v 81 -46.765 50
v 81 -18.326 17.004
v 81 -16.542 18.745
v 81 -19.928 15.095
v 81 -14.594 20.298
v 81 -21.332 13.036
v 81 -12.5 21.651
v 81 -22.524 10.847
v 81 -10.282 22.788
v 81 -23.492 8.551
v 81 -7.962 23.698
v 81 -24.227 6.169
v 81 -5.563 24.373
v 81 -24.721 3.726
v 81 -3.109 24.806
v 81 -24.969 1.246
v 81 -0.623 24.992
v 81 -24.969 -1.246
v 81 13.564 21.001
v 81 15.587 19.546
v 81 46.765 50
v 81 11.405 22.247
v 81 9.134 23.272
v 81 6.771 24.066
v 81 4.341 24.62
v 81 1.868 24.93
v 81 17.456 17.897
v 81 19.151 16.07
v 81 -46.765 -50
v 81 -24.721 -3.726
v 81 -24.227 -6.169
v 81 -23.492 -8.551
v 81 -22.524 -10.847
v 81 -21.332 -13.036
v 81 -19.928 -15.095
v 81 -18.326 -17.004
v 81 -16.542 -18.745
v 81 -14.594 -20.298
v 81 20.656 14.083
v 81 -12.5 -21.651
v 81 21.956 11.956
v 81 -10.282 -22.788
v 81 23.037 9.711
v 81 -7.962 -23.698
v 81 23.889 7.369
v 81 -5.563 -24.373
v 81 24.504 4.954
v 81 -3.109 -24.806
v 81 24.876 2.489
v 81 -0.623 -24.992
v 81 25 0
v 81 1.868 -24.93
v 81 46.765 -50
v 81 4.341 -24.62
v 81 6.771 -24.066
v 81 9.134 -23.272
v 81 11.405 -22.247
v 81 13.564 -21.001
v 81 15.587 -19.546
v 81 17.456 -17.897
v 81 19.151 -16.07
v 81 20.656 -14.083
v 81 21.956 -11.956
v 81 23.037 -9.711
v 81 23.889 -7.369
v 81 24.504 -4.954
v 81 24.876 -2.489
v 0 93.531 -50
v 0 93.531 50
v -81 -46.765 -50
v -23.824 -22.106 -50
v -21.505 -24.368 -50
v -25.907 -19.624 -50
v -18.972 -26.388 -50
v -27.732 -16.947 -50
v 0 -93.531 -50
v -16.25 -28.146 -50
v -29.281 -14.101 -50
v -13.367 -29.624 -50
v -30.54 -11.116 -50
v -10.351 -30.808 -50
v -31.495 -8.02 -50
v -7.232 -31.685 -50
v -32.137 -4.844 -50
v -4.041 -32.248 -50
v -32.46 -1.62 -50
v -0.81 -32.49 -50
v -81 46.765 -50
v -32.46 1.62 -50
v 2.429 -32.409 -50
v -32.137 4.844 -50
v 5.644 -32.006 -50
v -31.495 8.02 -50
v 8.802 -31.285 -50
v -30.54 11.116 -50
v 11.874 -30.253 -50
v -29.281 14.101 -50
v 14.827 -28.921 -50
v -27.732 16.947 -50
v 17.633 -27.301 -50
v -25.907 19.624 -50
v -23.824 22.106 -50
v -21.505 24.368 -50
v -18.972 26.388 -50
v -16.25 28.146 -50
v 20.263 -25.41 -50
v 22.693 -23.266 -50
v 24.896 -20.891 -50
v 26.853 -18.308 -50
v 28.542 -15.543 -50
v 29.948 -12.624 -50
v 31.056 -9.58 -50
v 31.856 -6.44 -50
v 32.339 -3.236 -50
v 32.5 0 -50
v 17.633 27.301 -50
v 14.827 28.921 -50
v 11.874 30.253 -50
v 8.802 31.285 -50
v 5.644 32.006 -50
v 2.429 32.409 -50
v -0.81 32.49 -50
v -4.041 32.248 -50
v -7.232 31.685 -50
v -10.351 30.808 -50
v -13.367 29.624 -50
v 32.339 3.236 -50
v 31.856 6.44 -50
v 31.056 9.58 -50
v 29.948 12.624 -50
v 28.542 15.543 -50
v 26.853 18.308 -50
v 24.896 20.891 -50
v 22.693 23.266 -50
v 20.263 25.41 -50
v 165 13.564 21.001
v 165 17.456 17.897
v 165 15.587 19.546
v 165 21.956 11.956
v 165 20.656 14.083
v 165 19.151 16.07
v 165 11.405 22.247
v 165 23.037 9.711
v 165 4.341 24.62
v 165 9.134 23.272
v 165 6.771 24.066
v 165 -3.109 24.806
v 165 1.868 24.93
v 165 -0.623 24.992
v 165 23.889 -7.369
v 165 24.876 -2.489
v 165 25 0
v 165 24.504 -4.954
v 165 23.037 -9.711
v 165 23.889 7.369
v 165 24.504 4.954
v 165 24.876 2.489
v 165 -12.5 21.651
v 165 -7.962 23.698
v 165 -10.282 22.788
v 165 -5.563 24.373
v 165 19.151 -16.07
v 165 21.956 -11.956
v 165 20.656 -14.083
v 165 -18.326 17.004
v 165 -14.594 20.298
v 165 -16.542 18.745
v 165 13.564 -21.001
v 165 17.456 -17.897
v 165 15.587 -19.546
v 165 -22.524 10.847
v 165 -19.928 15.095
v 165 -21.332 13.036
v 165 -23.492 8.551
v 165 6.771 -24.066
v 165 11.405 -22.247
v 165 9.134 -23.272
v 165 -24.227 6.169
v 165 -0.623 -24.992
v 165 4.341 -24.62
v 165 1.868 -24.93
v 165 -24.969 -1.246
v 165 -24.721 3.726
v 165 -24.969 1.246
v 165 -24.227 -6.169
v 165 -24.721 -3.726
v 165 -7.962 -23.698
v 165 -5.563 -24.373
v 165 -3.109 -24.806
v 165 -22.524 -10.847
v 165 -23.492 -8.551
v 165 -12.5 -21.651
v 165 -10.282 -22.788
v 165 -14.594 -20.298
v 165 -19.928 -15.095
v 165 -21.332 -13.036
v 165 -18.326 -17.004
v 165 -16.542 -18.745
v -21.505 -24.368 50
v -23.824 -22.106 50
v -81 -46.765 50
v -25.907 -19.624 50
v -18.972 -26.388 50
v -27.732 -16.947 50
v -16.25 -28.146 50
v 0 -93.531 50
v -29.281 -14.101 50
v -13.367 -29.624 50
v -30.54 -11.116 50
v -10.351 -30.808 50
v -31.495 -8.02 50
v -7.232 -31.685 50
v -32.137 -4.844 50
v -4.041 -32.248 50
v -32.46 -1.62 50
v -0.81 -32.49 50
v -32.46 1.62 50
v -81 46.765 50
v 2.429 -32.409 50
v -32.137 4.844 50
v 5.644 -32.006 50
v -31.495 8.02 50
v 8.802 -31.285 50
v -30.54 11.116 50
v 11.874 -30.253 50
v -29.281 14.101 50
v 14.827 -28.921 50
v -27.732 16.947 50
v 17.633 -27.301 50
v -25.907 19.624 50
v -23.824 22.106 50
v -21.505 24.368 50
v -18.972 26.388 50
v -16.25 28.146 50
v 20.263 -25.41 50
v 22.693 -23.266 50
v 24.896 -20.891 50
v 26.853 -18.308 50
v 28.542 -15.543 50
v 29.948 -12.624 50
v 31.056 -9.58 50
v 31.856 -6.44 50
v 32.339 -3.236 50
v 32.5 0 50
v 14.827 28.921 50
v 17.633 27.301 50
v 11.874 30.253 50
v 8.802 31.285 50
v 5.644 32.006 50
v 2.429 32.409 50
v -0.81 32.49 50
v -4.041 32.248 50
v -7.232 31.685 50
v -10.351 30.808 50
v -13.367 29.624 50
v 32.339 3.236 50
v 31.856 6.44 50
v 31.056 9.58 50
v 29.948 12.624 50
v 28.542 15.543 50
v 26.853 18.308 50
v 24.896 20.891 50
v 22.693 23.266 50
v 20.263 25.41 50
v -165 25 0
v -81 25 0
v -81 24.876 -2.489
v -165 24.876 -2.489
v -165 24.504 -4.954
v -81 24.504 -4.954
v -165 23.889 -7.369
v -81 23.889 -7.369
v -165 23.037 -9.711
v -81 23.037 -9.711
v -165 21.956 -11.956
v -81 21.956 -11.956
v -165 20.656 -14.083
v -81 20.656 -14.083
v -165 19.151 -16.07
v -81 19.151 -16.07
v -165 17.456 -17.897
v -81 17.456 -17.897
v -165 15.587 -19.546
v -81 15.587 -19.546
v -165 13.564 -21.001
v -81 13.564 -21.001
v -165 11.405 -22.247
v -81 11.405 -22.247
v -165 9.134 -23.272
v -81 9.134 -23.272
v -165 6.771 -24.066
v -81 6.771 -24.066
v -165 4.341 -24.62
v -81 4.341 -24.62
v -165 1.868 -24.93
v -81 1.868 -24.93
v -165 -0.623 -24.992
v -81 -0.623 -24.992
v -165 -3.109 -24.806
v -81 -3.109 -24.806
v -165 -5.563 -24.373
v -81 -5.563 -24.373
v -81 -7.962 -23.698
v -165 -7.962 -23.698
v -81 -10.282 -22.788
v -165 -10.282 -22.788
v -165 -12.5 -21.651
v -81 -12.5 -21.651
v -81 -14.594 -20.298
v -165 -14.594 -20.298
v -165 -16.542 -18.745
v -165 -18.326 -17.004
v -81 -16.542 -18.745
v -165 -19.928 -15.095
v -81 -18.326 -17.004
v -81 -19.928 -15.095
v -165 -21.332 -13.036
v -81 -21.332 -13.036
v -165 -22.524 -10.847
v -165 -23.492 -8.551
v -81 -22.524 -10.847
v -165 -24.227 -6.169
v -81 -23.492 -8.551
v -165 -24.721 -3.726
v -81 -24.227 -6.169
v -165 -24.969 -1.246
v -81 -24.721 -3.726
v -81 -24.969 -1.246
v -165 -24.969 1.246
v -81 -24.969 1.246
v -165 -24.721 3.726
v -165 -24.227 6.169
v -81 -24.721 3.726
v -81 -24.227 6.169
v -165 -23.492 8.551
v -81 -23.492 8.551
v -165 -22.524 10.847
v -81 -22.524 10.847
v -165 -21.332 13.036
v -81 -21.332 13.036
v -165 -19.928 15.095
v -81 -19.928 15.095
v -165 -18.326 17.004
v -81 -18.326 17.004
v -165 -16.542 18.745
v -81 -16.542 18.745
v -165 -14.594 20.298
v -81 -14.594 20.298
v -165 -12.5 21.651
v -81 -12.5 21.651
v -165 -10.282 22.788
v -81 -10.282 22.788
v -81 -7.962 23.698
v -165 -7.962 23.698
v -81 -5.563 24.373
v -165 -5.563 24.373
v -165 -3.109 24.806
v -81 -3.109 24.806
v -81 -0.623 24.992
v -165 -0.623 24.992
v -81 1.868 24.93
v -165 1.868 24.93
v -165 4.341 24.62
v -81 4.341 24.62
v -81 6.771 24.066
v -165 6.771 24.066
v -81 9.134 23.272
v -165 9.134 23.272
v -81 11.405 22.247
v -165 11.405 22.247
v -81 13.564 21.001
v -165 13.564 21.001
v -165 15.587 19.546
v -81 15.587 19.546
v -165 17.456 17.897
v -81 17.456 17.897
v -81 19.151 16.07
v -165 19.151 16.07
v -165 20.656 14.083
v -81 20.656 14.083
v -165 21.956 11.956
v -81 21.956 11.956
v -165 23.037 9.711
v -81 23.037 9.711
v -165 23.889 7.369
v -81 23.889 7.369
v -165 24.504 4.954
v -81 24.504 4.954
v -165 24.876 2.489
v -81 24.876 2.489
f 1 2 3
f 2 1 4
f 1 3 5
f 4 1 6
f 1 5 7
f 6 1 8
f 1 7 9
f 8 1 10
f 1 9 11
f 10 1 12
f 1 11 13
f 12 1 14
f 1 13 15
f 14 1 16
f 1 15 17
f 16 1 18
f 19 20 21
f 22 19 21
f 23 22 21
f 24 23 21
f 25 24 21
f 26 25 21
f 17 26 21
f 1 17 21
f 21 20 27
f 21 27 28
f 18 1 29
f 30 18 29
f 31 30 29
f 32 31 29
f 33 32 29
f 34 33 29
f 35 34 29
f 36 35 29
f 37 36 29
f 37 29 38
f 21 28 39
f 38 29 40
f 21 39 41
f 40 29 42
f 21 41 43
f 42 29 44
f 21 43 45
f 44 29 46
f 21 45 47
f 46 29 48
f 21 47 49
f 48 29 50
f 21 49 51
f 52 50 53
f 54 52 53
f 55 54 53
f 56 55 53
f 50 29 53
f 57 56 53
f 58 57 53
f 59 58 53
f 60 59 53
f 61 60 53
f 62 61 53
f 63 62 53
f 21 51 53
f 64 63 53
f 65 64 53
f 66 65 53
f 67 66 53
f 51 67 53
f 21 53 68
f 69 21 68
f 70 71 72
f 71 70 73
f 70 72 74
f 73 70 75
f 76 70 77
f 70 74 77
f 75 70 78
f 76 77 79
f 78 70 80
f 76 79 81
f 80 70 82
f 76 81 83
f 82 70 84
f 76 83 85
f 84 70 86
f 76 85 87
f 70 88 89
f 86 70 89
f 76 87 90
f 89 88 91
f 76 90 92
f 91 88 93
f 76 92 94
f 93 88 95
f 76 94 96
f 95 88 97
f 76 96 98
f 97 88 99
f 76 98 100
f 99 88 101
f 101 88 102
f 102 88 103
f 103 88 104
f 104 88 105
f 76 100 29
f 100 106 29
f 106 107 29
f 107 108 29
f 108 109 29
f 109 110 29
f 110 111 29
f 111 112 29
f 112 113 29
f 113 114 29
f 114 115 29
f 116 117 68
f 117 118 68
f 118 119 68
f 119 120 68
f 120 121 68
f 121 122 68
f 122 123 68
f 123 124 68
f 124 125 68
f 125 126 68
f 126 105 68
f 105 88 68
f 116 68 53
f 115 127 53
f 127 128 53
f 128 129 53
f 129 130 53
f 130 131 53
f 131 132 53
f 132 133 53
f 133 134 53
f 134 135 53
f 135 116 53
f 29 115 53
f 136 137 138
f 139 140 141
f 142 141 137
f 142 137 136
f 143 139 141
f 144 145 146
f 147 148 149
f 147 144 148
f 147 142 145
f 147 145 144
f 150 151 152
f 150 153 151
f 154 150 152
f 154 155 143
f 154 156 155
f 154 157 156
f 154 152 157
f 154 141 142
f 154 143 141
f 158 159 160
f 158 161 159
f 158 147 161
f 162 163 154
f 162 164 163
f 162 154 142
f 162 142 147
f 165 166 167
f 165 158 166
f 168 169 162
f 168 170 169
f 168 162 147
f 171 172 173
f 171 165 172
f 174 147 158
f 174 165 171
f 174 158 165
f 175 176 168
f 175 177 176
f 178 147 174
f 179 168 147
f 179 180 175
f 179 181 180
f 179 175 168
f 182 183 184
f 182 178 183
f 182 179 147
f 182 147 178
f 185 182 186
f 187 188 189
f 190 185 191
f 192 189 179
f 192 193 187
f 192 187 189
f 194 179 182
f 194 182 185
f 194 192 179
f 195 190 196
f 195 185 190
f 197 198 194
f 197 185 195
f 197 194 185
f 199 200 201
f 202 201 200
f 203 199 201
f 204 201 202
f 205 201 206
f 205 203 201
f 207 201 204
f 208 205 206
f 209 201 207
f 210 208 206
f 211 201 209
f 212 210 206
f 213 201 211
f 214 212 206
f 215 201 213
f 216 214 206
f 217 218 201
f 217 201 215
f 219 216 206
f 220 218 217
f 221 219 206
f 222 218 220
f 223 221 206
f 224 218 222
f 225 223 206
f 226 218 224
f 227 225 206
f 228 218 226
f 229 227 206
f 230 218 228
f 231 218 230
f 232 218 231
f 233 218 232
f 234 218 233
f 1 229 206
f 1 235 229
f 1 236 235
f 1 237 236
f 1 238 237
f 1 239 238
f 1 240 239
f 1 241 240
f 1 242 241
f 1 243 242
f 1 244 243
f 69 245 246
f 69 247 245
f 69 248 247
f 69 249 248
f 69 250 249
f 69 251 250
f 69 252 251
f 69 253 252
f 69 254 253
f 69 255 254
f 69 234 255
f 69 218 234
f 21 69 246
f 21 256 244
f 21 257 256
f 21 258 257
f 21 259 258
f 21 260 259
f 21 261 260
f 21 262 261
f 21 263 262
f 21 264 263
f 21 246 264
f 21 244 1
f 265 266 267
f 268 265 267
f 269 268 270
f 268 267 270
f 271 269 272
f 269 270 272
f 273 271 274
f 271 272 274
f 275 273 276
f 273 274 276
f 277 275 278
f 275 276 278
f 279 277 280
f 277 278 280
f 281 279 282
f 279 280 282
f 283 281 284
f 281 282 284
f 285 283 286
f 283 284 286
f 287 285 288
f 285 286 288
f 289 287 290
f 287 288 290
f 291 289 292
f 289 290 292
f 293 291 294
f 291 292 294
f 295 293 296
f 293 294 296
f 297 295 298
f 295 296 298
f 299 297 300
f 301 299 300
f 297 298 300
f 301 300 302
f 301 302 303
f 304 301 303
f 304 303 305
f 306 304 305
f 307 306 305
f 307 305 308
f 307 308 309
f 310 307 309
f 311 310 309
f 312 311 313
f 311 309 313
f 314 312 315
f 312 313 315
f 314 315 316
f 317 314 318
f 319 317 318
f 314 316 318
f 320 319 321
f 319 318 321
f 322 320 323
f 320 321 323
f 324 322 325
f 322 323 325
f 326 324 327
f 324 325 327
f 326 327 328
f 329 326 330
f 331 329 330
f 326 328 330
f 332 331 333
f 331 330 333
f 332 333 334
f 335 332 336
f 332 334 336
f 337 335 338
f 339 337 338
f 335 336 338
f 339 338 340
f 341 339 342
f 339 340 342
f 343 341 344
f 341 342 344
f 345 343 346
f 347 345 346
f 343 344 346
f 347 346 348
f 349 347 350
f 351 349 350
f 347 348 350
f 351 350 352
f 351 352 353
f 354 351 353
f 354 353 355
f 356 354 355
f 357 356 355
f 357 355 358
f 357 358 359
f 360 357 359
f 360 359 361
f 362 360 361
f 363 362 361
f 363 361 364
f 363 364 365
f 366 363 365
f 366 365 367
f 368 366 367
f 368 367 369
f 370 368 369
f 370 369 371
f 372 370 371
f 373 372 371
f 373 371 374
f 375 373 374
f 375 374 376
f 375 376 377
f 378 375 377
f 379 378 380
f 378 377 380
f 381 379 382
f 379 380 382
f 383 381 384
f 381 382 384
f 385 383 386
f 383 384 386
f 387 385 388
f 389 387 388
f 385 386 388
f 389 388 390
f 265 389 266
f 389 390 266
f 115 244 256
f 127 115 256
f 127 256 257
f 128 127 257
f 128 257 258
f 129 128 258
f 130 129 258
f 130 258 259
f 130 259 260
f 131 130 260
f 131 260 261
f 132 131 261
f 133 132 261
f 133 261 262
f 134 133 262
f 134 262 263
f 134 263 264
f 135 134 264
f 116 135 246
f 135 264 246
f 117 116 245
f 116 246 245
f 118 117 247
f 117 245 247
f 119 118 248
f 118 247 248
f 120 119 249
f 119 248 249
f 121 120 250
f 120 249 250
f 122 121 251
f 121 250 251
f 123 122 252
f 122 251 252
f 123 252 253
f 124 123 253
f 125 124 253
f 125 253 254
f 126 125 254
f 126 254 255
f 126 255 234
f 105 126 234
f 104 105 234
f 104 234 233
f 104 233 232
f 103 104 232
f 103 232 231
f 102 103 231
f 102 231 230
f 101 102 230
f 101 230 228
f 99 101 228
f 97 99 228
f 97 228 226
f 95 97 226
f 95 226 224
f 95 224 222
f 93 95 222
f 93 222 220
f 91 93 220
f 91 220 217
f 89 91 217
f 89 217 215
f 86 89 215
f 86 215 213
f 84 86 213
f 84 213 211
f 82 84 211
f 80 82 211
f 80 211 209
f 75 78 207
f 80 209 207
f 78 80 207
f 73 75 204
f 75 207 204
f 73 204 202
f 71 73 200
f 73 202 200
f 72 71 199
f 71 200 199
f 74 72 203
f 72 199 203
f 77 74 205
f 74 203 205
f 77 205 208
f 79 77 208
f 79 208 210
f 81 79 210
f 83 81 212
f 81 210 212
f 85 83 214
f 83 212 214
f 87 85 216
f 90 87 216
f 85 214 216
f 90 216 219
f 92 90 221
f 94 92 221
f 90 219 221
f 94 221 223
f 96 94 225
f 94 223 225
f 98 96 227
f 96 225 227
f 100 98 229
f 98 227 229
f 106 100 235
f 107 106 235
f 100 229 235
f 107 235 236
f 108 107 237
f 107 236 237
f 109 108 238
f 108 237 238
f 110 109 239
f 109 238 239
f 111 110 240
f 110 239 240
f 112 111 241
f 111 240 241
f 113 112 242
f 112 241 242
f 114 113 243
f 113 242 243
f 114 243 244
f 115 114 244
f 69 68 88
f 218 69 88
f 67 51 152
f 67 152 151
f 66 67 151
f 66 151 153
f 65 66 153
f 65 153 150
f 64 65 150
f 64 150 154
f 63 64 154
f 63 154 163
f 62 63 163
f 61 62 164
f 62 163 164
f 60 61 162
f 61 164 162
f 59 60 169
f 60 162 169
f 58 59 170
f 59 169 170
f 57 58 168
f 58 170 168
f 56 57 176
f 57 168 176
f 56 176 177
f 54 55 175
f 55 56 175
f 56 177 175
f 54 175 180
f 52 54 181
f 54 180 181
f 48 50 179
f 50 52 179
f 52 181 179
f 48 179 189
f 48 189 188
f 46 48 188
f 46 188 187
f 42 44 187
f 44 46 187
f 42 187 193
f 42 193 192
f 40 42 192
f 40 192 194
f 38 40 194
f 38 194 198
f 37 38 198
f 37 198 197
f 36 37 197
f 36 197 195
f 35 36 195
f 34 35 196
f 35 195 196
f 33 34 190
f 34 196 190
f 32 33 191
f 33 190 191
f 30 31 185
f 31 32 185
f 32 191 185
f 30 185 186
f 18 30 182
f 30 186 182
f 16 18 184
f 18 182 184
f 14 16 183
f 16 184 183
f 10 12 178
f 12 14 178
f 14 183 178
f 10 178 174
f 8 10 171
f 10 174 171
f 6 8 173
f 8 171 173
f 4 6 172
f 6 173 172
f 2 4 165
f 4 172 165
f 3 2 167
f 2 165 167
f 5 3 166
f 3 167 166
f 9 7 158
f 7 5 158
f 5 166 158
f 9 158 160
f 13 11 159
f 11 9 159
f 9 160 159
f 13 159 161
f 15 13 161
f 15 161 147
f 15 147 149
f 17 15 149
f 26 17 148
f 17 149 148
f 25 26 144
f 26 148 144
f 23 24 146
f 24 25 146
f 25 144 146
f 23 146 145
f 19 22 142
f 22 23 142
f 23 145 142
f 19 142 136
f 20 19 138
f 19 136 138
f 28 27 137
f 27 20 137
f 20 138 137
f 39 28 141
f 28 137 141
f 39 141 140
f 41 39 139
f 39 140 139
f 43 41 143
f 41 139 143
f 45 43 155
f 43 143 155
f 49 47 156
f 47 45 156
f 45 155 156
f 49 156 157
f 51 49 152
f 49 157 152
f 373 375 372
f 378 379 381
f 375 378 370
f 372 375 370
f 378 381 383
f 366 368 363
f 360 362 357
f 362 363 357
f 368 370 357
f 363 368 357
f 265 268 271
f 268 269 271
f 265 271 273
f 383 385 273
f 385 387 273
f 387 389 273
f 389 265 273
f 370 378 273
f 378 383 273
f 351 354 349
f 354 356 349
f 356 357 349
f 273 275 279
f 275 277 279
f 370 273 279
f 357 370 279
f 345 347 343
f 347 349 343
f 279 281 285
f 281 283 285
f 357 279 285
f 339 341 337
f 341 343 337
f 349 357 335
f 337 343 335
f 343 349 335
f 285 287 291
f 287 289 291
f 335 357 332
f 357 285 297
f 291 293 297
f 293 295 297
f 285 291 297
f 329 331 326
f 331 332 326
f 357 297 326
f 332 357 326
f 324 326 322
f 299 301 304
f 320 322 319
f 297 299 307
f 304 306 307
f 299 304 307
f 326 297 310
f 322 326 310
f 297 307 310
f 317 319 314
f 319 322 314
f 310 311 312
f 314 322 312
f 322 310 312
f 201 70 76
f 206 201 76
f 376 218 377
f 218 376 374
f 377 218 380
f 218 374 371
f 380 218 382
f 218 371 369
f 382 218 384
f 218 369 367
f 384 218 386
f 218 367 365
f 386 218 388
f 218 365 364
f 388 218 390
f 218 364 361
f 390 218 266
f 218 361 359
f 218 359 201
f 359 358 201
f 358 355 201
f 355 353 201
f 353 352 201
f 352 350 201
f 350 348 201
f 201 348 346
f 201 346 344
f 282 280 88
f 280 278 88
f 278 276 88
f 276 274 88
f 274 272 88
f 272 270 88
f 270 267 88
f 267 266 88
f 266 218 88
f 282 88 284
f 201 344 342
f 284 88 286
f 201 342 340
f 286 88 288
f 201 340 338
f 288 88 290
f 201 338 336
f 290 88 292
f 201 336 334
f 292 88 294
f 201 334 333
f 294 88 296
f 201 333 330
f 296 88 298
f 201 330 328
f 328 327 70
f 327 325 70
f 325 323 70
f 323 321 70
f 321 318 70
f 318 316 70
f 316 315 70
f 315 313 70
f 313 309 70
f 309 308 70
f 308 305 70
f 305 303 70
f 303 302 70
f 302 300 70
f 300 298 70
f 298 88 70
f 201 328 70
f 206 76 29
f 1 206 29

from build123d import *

# Parameters (mm, degrees)
BOSS_EXTRUDE2_DEPTH      = 50
BOSS_EXTRUDE2_DEPTH_BACK = 50
SKETCH4_W                = 330
SKETCH4_H                = 25
SKETCH5_R                = 32.5
CUT_EXTRUDE1_DEPTH       = 215.413152582


with BuildPart() as part:
    # Sketch1 → Boss-Extrude2 (new, two sides: drawn at the far end of the back side and taken through both)
    with BuildSketch(Plane.XY.offset(-BOSS_EXTRUDE2_DEPTH_BACK)):
        Polygon((0, -93.530743609), (81, -46.765371804), (81, 46.765371804), (0, 93.530743609), (-81, 46.765371804), (-81, -46.765371804), align=None)
    extrude(amount=BOSS_EXTRUDE2_DEPTH + BOSS_EXTRUDE2_DEPTH_BACK)

    # Sketch4 → Revolve2 (revolve)
    with BuildSketch(Plane.XY):
        with Locations((0, 12.5)):
            Rectangle(SKETCH4_W, SKETCH4_H)
    revolve(axis=Axis((165, 0, 0), (-1, 0, 0)))

    # Sketch5 → Cut-Extrude1 (cut, through all)
    with BuildSketch(Plane.XY.offset(50)):
        Circle(SKETCH5_R)
    extrude(amount=-CUT_EXTRUDE1_DEPTH, mode=Mode.SUBTRACT)


solid = part.part
